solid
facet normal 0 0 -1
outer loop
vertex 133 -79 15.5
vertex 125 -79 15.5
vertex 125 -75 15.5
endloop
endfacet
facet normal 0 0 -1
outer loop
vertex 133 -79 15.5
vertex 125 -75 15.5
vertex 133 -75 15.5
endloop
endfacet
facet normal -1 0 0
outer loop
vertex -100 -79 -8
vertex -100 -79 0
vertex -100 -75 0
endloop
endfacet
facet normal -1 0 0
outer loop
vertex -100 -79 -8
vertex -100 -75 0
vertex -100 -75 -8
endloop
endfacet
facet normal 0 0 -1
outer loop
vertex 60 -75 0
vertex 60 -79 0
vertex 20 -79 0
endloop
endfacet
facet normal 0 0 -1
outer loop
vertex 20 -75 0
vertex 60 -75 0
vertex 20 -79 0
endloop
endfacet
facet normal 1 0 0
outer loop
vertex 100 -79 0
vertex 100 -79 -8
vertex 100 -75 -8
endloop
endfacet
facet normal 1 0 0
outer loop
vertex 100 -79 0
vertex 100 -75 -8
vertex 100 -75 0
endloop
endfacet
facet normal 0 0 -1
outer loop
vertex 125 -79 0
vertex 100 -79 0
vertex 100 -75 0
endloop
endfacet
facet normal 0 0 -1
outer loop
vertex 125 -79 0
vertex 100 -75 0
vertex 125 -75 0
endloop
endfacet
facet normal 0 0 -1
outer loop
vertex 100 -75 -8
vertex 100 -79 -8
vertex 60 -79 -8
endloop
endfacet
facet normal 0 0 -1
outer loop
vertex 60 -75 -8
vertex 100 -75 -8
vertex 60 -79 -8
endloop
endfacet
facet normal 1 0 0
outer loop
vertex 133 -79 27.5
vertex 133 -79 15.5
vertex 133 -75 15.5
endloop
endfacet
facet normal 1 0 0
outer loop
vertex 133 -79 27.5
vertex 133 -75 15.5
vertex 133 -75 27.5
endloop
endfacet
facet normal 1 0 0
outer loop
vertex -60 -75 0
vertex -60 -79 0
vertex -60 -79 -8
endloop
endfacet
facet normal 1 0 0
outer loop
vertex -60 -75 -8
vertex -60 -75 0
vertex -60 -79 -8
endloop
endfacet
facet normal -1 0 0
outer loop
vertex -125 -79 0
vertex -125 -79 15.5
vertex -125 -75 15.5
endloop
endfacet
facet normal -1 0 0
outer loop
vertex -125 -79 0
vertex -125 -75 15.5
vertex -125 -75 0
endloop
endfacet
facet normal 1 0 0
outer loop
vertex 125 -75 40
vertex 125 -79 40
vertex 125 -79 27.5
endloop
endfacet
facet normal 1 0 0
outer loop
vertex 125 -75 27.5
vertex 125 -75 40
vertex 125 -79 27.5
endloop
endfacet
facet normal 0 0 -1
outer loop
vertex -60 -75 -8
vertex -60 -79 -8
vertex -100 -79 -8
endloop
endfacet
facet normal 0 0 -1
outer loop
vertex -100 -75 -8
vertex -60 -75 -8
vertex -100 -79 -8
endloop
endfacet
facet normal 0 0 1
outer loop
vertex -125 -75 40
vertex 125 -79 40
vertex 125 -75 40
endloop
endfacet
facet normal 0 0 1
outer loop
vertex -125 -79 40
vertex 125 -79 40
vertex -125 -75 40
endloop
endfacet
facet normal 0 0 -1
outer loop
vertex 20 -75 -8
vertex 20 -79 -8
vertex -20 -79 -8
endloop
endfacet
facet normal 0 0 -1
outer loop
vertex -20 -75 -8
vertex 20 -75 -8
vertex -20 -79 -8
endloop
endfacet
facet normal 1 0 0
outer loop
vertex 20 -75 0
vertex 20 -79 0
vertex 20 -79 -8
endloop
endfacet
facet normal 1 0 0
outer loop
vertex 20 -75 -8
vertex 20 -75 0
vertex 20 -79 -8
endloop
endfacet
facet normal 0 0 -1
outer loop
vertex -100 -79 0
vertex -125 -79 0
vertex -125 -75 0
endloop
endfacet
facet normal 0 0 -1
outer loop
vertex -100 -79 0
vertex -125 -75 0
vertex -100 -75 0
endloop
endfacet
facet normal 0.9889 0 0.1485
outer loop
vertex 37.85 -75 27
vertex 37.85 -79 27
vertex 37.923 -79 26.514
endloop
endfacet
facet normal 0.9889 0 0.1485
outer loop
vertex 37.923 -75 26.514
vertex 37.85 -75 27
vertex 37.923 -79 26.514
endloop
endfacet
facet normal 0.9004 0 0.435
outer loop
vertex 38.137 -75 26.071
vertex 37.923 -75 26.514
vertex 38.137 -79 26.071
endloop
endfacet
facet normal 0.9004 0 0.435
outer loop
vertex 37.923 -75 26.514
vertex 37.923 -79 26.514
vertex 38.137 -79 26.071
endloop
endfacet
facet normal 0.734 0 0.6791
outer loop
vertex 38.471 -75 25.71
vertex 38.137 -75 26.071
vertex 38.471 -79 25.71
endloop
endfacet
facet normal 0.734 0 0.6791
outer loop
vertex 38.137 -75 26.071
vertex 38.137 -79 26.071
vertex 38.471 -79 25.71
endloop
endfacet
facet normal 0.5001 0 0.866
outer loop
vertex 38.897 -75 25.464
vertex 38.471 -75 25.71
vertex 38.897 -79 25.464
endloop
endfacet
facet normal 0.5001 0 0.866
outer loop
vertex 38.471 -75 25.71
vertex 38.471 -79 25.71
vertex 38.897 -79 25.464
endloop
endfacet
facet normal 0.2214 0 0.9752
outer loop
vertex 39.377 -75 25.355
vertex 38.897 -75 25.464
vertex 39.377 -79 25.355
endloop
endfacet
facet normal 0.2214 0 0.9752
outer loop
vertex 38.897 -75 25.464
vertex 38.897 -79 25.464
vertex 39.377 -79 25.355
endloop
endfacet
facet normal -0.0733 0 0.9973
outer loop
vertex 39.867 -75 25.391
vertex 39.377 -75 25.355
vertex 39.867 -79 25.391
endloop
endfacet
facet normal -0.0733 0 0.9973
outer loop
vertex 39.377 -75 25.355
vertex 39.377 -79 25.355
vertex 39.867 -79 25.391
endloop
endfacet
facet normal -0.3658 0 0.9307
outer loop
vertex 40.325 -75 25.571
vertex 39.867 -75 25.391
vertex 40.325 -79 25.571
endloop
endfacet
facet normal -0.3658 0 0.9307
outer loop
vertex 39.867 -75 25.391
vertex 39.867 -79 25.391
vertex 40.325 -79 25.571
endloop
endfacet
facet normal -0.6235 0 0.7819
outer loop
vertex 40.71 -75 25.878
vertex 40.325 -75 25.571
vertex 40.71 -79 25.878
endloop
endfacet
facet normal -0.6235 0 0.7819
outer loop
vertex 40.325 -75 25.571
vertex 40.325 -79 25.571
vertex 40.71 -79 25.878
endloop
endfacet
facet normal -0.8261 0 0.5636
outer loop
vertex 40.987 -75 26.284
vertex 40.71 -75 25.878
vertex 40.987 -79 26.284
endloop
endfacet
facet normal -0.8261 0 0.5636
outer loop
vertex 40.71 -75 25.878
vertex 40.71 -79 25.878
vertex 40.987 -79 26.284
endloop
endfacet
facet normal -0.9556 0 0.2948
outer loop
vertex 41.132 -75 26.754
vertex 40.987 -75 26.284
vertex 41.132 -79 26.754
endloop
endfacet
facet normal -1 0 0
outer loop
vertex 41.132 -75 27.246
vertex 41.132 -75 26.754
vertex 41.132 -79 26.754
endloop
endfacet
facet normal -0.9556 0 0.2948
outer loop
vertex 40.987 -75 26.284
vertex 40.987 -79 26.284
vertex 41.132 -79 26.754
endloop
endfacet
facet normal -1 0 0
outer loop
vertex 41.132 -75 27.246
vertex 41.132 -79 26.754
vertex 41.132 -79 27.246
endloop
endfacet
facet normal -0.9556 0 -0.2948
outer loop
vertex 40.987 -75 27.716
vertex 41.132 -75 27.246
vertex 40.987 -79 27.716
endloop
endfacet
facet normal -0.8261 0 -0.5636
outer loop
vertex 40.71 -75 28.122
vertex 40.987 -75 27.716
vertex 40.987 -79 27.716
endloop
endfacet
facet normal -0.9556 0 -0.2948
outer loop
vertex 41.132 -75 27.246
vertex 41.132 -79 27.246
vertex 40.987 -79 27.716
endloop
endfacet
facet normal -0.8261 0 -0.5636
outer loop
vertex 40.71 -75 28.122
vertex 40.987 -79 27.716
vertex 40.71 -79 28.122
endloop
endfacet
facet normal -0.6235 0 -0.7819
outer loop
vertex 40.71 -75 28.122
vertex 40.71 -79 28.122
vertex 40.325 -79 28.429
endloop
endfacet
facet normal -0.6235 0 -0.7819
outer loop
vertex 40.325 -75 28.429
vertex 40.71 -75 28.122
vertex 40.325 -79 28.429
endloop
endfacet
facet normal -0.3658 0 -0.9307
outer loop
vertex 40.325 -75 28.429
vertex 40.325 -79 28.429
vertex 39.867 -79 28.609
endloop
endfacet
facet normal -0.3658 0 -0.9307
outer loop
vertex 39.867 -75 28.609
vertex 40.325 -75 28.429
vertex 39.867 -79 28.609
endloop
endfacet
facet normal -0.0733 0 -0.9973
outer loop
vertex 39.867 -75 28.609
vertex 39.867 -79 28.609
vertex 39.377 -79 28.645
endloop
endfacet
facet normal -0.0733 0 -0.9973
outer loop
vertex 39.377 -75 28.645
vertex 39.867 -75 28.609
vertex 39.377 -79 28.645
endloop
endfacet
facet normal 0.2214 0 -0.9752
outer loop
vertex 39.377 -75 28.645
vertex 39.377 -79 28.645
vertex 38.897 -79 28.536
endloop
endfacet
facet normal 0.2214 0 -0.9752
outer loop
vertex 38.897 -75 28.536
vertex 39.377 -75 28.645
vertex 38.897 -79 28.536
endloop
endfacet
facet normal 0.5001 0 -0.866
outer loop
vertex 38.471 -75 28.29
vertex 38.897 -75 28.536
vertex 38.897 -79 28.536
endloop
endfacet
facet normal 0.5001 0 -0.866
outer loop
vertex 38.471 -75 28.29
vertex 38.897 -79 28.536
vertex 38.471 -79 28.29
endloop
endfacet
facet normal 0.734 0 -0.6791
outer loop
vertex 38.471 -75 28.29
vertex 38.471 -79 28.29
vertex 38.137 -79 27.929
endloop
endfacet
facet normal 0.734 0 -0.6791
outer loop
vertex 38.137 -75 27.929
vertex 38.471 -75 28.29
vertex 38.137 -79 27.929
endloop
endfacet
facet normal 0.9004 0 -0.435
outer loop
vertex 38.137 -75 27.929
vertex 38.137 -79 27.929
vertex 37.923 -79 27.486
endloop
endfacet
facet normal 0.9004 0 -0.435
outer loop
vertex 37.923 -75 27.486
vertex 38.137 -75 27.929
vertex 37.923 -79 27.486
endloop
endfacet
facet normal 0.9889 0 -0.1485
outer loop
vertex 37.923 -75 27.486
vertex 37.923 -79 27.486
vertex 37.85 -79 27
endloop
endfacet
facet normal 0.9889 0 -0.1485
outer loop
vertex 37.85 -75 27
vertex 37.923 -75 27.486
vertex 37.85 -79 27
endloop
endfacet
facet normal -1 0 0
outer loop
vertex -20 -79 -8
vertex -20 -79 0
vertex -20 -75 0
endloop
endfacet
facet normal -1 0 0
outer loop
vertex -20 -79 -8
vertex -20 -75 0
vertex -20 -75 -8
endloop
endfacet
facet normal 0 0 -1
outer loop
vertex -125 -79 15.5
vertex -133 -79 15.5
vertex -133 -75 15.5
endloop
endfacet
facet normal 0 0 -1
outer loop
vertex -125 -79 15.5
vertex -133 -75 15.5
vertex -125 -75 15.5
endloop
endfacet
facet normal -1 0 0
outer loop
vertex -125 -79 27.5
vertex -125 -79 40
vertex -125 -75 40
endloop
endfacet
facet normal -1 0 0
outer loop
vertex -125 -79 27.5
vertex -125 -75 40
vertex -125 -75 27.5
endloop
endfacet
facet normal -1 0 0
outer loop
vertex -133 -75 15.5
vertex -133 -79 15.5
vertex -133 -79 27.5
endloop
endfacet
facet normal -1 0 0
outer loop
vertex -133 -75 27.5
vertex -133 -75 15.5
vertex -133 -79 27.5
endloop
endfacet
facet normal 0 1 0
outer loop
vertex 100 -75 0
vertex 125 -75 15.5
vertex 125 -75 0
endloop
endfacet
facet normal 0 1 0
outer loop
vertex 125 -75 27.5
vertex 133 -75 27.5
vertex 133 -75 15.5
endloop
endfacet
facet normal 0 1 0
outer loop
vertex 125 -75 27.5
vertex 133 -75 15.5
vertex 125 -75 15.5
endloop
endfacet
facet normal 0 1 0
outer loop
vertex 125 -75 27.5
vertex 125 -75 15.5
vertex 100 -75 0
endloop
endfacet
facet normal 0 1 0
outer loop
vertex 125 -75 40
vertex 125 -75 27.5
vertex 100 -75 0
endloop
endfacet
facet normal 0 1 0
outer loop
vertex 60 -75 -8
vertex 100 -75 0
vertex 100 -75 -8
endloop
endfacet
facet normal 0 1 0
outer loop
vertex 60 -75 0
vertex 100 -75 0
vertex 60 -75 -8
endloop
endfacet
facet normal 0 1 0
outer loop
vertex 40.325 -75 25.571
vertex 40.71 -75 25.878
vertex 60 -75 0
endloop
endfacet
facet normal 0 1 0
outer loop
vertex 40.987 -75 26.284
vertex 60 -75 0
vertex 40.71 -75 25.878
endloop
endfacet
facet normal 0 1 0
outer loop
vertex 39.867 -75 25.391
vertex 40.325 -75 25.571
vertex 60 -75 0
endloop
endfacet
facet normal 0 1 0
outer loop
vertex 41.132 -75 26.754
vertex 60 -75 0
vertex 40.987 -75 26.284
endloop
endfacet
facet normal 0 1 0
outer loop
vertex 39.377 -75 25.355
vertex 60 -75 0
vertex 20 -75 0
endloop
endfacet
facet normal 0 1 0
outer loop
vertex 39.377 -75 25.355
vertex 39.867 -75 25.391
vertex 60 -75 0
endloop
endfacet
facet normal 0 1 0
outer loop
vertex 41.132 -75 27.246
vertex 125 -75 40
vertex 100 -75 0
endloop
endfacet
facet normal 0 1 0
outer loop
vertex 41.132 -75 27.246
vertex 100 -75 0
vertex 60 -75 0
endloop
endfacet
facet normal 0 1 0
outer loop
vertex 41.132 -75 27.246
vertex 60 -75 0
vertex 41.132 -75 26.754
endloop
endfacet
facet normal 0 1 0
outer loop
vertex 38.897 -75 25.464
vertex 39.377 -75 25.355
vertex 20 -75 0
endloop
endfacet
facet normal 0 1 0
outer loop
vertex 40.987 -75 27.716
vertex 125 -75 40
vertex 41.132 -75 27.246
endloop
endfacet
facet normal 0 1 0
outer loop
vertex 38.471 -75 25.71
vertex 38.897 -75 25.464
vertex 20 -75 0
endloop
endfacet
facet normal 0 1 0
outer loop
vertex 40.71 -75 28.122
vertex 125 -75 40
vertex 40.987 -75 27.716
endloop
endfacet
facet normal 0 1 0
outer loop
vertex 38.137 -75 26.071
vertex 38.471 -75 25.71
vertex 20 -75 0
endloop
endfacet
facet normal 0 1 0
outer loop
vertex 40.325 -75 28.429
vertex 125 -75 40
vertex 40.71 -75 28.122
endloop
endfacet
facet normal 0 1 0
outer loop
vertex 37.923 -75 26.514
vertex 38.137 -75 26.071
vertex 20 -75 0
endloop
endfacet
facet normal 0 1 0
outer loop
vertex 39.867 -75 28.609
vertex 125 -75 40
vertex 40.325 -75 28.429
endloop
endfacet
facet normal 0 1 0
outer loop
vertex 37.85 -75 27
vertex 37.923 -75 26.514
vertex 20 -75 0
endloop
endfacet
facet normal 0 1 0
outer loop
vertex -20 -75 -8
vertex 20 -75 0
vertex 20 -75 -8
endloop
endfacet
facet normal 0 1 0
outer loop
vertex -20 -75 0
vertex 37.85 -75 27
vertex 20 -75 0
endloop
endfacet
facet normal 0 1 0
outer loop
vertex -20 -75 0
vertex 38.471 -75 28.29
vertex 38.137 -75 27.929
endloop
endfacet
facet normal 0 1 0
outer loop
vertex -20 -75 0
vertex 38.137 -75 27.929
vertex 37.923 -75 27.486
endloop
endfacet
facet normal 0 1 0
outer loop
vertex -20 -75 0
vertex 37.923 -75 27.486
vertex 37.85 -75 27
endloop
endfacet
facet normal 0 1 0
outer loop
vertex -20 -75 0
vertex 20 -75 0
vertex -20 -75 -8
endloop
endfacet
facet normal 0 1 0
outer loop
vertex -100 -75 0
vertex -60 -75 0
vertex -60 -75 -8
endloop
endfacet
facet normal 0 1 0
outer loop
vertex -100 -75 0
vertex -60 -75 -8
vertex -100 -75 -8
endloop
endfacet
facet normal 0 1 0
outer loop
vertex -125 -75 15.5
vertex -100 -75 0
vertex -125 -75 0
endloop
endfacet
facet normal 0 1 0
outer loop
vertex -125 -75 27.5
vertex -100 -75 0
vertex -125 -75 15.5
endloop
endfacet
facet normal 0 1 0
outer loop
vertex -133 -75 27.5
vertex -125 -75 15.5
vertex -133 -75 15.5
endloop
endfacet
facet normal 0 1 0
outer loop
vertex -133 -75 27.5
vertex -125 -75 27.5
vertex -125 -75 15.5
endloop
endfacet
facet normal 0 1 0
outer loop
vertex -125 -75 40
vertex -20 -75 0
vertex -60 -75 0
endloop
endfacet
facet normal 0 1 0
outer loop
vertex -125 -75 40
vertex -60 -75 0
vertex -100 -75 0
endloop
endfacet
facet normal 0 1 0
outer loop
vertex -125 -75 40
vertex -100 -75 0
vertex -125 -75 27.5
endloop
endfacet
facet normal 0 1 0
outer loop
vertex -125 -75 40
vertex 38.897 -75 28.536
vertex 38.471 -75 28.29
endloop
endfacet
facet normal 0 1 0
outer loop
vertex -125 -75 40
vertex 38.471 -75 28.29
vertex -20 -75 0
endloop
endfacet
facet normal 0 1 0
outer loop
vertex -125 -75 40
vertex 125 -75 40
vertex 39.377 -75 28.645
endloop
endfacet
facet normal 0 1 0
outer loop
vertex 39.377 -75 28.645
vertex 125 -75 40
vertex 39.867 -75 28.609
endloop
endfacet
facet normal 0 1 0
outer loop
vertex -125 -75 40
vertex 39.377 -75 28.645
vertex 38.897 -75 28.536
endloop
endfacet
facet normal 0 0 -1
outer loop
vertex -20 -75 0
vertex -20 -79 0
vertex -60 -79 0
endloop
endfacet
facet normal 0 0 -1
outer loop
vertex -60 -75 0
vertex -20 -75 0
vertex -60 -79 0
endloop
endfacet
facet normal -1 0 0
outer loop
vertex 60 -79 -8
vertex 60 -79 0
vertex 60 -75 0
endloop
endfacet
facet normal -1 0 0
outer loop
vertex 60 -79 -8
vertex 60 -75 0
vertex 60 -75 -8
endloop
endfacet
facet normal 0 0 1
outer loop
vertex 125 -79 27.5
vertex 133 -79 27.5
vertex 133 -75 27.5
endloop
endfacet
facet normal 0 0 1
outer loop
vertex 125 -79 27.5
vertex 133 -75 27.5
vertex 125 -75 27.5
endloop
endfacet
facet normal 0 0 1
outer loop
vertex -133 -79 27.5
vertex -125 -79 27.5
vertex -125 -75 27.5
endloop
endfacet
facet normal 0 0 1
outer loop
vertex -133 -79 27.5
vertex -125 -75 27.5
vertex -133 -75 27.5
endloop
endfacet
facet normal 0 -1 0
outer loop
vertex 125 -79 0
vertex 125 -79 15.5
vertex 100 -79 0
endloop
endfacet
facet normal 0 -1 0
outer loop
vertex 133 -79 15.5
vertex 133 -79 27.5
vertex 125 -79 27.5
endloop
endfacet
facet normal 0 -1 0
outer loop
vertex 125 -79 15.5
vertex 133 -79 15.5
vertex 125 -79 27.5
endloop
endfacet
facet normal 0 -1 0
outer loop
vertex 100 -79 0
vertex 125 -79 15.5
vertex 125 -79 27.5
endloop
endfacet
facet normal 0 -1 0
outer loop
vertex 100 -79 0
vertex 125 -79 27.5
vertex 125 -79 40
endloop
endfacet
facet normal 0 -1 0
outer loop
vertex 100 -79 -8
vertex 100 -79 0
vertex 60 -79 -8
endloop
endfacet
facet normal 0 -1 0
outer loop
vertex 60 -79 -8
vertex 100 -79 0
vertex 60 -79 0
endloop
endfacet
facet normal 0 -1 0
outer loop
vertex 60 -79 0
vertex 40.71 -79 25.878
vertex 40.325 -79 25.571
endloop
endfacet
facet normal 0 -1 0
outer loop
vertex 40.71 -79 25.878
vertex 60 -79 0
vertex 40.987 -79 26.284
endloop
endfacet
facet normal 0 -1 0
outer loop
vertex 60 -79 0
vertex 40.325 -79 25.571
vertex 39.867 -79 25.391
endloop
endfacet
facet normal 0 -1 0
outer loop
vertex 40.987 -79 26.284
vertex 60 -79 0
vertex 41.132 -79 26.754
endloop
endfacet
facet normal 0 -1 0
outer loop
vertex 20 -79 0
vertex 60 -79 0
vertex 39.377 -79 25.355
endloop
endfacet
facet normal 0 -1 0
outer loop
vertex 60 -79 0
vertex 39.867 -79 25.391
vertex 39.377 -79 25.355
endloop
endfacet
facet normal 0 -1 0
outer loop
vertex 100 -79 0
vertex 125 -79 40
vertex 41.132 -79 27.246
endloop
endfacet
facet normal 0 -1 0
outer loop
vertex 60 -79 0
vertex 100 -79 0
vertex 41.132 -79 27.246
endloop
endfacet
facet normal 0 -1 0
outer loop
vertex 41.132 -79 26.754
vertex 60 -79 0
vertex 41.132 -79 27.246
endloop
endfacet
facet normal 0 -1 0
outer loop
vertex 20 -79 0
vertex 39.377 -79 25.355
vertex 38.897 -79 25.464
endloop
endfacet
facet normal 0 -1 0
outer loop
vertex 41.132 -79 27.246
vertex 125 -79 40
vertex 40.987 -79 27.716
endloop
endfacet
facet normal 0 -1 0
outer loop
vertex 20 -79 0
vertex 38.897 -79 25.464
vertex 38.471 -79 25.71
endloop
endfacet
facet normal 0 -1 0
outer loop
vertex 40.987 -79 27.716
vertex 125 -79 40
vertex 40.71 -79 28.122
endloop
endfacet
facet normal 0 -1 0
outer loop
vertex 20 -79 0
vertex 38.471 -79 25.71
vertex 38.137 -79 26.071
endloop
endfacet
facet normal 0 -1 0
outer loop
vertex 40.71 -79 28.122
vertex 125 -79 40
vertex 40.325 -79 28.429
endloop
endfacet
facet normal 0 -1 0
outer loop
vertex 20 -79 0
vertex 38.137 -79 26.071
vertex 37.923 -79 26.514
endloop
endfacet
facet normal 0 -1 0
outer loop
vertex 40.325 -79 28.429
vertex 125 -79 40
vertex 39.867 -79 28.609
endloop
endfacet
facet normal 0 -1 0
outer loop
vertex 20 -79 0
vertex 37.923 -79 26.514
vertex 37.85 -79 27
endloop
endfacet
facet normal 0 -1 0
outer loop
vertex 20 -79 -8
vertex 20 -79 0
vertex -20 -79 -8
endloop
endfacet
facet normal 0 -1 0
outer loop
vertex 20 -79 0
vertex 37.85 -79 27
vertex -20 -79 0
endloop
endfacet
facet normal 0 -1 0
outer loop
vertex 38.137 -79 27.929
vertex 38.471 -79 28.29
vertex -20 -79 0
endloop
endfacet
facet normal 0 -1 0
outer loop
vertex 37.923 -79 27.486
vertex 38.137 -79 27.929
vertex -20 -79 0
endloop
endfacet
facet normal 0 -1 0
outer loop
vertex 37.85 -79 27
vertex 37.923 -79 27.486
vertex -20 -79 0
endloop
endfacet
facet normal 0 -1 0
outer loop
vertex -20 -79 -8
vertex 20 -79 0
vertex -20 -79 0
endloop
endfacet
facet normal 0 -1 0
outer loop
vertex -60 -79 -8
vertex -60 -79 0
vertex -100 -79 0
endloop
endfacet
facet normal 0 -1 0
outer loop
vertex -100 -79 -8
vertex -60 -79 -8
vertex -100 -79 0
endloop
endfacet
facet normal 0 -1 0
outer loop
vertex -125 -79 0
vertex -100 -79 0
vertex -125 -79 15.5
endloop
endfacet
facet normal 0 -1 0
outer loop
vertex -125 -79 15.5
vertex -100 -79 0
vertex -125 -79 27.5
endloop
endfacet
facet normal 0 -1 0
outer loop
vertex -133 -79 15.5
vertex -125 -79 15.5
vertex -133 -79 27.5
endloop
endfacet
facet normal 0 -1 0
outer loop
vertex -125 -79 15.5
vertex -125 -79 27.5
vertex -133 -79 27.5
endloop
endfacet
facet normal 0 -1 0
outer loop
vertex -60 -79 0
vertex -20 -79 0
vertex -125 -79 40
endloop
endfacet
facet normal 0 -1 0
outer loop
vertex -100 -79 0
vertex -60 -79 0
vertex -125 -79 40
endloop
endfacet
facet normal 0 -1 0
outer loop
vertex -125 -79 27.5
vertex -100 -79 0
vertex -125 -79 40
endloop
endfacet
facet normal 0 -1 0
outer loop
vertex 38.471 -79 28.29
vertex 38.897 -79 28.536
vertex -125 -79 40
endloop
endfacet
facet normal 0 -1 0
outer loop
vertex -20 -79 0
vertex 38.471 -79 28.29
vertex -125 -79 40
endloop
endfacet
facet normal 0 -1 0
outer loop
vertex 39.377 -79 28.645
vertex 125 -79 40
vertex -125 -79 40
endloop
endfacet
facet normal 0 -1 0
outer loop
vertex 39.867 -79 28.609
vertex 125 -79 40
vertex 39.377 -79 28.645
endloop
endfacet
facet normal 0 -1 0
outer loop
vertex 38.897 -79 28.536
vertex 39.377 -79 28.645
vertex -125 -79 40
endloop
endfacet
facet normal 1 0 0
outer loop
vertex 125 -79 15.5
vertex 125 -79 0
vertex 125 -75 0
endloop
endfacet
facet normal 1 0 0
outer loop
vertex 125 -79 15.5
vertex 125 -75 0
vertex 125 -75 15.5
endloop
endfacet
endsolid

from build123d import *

# Parameters (mm, degrees)
SKETCH012_W     = 266
SKETCH012_H     = 48
PAD009_DEPTH    = 4
SKETCH022_W     = 40
SKETCH022_H     = 30
SKETCH022_W_2   = 30
SKETCH022_H_2   = 20
POCKET005_DEPTH = 4.001
SKETCH038_R     = 1.65
HOLE003_DEPTH   = 25


with BuildPart() as part:
    # Sketch012 (on DatumPlane) → Pad009 (new body)
    with BuildSketch(Plane(origin=(0, -79, -4), x_dir=(-1, 0, 0), z_dir=(0, 1, 0))):
        with Locations((0, 20)):
            Rectangle(SKETCH012_W, SKETCH012_H)
    extrude(amount=PAD009_DEPTH)

    # Sketch022 (on Face5 of Pad009) → Pocket005 (cut, through all)
    with BuildSketch(Plane(origin=(0, -79, -4), x_dir=(-1, 0, 0), z_dir=(0, -1, 0))):
        Polygon((-145, 26), (-100, 26), (-100, -4), (-125, -4), (-125, -19.5), (-155, -19.5), (-155, 0.5), (-145, 0.5), align=None)
        with Locations((-40, 11)):
            Rectangle(SKETCH022_W, SKETCH022_H)
        with Locations((40, 11)):
            Rectangle(SKETCH022_W, SKETCH022_H)
        Polygon((100, 26), (145, 26), (145, 0.5), (155, 0.5), (155, -19.5), (125, -19.5), (125, -4), (100, -4), align=None)
        with Locations((-140, -41.5)):
            Rectangle(SKETCH022_W_2, SKETCH022_H_2)
        with Locations((140, -41.5)):
            Rectangle(SKETCH022_W_2, SKETCH022_H_2)
    extrude(amount=-POCKET005_DEPTH, mode=Mode.SUBTRACT)

    # Sketch038 (on Face2 of Pocket005) → Hole003 (cut)
    with BuildSketch(Plane(origin=(0, -79, -4), x_dir=(-1, 0, 0), z_dir=(0, -1, 0))):
        with Locations((-39.5, -31)):
            Circle(SKETCH038_R)
    extrude(amount=-HOLE003_DEPTH, mode=Mode.SUBTRACT)


solid = part.part
